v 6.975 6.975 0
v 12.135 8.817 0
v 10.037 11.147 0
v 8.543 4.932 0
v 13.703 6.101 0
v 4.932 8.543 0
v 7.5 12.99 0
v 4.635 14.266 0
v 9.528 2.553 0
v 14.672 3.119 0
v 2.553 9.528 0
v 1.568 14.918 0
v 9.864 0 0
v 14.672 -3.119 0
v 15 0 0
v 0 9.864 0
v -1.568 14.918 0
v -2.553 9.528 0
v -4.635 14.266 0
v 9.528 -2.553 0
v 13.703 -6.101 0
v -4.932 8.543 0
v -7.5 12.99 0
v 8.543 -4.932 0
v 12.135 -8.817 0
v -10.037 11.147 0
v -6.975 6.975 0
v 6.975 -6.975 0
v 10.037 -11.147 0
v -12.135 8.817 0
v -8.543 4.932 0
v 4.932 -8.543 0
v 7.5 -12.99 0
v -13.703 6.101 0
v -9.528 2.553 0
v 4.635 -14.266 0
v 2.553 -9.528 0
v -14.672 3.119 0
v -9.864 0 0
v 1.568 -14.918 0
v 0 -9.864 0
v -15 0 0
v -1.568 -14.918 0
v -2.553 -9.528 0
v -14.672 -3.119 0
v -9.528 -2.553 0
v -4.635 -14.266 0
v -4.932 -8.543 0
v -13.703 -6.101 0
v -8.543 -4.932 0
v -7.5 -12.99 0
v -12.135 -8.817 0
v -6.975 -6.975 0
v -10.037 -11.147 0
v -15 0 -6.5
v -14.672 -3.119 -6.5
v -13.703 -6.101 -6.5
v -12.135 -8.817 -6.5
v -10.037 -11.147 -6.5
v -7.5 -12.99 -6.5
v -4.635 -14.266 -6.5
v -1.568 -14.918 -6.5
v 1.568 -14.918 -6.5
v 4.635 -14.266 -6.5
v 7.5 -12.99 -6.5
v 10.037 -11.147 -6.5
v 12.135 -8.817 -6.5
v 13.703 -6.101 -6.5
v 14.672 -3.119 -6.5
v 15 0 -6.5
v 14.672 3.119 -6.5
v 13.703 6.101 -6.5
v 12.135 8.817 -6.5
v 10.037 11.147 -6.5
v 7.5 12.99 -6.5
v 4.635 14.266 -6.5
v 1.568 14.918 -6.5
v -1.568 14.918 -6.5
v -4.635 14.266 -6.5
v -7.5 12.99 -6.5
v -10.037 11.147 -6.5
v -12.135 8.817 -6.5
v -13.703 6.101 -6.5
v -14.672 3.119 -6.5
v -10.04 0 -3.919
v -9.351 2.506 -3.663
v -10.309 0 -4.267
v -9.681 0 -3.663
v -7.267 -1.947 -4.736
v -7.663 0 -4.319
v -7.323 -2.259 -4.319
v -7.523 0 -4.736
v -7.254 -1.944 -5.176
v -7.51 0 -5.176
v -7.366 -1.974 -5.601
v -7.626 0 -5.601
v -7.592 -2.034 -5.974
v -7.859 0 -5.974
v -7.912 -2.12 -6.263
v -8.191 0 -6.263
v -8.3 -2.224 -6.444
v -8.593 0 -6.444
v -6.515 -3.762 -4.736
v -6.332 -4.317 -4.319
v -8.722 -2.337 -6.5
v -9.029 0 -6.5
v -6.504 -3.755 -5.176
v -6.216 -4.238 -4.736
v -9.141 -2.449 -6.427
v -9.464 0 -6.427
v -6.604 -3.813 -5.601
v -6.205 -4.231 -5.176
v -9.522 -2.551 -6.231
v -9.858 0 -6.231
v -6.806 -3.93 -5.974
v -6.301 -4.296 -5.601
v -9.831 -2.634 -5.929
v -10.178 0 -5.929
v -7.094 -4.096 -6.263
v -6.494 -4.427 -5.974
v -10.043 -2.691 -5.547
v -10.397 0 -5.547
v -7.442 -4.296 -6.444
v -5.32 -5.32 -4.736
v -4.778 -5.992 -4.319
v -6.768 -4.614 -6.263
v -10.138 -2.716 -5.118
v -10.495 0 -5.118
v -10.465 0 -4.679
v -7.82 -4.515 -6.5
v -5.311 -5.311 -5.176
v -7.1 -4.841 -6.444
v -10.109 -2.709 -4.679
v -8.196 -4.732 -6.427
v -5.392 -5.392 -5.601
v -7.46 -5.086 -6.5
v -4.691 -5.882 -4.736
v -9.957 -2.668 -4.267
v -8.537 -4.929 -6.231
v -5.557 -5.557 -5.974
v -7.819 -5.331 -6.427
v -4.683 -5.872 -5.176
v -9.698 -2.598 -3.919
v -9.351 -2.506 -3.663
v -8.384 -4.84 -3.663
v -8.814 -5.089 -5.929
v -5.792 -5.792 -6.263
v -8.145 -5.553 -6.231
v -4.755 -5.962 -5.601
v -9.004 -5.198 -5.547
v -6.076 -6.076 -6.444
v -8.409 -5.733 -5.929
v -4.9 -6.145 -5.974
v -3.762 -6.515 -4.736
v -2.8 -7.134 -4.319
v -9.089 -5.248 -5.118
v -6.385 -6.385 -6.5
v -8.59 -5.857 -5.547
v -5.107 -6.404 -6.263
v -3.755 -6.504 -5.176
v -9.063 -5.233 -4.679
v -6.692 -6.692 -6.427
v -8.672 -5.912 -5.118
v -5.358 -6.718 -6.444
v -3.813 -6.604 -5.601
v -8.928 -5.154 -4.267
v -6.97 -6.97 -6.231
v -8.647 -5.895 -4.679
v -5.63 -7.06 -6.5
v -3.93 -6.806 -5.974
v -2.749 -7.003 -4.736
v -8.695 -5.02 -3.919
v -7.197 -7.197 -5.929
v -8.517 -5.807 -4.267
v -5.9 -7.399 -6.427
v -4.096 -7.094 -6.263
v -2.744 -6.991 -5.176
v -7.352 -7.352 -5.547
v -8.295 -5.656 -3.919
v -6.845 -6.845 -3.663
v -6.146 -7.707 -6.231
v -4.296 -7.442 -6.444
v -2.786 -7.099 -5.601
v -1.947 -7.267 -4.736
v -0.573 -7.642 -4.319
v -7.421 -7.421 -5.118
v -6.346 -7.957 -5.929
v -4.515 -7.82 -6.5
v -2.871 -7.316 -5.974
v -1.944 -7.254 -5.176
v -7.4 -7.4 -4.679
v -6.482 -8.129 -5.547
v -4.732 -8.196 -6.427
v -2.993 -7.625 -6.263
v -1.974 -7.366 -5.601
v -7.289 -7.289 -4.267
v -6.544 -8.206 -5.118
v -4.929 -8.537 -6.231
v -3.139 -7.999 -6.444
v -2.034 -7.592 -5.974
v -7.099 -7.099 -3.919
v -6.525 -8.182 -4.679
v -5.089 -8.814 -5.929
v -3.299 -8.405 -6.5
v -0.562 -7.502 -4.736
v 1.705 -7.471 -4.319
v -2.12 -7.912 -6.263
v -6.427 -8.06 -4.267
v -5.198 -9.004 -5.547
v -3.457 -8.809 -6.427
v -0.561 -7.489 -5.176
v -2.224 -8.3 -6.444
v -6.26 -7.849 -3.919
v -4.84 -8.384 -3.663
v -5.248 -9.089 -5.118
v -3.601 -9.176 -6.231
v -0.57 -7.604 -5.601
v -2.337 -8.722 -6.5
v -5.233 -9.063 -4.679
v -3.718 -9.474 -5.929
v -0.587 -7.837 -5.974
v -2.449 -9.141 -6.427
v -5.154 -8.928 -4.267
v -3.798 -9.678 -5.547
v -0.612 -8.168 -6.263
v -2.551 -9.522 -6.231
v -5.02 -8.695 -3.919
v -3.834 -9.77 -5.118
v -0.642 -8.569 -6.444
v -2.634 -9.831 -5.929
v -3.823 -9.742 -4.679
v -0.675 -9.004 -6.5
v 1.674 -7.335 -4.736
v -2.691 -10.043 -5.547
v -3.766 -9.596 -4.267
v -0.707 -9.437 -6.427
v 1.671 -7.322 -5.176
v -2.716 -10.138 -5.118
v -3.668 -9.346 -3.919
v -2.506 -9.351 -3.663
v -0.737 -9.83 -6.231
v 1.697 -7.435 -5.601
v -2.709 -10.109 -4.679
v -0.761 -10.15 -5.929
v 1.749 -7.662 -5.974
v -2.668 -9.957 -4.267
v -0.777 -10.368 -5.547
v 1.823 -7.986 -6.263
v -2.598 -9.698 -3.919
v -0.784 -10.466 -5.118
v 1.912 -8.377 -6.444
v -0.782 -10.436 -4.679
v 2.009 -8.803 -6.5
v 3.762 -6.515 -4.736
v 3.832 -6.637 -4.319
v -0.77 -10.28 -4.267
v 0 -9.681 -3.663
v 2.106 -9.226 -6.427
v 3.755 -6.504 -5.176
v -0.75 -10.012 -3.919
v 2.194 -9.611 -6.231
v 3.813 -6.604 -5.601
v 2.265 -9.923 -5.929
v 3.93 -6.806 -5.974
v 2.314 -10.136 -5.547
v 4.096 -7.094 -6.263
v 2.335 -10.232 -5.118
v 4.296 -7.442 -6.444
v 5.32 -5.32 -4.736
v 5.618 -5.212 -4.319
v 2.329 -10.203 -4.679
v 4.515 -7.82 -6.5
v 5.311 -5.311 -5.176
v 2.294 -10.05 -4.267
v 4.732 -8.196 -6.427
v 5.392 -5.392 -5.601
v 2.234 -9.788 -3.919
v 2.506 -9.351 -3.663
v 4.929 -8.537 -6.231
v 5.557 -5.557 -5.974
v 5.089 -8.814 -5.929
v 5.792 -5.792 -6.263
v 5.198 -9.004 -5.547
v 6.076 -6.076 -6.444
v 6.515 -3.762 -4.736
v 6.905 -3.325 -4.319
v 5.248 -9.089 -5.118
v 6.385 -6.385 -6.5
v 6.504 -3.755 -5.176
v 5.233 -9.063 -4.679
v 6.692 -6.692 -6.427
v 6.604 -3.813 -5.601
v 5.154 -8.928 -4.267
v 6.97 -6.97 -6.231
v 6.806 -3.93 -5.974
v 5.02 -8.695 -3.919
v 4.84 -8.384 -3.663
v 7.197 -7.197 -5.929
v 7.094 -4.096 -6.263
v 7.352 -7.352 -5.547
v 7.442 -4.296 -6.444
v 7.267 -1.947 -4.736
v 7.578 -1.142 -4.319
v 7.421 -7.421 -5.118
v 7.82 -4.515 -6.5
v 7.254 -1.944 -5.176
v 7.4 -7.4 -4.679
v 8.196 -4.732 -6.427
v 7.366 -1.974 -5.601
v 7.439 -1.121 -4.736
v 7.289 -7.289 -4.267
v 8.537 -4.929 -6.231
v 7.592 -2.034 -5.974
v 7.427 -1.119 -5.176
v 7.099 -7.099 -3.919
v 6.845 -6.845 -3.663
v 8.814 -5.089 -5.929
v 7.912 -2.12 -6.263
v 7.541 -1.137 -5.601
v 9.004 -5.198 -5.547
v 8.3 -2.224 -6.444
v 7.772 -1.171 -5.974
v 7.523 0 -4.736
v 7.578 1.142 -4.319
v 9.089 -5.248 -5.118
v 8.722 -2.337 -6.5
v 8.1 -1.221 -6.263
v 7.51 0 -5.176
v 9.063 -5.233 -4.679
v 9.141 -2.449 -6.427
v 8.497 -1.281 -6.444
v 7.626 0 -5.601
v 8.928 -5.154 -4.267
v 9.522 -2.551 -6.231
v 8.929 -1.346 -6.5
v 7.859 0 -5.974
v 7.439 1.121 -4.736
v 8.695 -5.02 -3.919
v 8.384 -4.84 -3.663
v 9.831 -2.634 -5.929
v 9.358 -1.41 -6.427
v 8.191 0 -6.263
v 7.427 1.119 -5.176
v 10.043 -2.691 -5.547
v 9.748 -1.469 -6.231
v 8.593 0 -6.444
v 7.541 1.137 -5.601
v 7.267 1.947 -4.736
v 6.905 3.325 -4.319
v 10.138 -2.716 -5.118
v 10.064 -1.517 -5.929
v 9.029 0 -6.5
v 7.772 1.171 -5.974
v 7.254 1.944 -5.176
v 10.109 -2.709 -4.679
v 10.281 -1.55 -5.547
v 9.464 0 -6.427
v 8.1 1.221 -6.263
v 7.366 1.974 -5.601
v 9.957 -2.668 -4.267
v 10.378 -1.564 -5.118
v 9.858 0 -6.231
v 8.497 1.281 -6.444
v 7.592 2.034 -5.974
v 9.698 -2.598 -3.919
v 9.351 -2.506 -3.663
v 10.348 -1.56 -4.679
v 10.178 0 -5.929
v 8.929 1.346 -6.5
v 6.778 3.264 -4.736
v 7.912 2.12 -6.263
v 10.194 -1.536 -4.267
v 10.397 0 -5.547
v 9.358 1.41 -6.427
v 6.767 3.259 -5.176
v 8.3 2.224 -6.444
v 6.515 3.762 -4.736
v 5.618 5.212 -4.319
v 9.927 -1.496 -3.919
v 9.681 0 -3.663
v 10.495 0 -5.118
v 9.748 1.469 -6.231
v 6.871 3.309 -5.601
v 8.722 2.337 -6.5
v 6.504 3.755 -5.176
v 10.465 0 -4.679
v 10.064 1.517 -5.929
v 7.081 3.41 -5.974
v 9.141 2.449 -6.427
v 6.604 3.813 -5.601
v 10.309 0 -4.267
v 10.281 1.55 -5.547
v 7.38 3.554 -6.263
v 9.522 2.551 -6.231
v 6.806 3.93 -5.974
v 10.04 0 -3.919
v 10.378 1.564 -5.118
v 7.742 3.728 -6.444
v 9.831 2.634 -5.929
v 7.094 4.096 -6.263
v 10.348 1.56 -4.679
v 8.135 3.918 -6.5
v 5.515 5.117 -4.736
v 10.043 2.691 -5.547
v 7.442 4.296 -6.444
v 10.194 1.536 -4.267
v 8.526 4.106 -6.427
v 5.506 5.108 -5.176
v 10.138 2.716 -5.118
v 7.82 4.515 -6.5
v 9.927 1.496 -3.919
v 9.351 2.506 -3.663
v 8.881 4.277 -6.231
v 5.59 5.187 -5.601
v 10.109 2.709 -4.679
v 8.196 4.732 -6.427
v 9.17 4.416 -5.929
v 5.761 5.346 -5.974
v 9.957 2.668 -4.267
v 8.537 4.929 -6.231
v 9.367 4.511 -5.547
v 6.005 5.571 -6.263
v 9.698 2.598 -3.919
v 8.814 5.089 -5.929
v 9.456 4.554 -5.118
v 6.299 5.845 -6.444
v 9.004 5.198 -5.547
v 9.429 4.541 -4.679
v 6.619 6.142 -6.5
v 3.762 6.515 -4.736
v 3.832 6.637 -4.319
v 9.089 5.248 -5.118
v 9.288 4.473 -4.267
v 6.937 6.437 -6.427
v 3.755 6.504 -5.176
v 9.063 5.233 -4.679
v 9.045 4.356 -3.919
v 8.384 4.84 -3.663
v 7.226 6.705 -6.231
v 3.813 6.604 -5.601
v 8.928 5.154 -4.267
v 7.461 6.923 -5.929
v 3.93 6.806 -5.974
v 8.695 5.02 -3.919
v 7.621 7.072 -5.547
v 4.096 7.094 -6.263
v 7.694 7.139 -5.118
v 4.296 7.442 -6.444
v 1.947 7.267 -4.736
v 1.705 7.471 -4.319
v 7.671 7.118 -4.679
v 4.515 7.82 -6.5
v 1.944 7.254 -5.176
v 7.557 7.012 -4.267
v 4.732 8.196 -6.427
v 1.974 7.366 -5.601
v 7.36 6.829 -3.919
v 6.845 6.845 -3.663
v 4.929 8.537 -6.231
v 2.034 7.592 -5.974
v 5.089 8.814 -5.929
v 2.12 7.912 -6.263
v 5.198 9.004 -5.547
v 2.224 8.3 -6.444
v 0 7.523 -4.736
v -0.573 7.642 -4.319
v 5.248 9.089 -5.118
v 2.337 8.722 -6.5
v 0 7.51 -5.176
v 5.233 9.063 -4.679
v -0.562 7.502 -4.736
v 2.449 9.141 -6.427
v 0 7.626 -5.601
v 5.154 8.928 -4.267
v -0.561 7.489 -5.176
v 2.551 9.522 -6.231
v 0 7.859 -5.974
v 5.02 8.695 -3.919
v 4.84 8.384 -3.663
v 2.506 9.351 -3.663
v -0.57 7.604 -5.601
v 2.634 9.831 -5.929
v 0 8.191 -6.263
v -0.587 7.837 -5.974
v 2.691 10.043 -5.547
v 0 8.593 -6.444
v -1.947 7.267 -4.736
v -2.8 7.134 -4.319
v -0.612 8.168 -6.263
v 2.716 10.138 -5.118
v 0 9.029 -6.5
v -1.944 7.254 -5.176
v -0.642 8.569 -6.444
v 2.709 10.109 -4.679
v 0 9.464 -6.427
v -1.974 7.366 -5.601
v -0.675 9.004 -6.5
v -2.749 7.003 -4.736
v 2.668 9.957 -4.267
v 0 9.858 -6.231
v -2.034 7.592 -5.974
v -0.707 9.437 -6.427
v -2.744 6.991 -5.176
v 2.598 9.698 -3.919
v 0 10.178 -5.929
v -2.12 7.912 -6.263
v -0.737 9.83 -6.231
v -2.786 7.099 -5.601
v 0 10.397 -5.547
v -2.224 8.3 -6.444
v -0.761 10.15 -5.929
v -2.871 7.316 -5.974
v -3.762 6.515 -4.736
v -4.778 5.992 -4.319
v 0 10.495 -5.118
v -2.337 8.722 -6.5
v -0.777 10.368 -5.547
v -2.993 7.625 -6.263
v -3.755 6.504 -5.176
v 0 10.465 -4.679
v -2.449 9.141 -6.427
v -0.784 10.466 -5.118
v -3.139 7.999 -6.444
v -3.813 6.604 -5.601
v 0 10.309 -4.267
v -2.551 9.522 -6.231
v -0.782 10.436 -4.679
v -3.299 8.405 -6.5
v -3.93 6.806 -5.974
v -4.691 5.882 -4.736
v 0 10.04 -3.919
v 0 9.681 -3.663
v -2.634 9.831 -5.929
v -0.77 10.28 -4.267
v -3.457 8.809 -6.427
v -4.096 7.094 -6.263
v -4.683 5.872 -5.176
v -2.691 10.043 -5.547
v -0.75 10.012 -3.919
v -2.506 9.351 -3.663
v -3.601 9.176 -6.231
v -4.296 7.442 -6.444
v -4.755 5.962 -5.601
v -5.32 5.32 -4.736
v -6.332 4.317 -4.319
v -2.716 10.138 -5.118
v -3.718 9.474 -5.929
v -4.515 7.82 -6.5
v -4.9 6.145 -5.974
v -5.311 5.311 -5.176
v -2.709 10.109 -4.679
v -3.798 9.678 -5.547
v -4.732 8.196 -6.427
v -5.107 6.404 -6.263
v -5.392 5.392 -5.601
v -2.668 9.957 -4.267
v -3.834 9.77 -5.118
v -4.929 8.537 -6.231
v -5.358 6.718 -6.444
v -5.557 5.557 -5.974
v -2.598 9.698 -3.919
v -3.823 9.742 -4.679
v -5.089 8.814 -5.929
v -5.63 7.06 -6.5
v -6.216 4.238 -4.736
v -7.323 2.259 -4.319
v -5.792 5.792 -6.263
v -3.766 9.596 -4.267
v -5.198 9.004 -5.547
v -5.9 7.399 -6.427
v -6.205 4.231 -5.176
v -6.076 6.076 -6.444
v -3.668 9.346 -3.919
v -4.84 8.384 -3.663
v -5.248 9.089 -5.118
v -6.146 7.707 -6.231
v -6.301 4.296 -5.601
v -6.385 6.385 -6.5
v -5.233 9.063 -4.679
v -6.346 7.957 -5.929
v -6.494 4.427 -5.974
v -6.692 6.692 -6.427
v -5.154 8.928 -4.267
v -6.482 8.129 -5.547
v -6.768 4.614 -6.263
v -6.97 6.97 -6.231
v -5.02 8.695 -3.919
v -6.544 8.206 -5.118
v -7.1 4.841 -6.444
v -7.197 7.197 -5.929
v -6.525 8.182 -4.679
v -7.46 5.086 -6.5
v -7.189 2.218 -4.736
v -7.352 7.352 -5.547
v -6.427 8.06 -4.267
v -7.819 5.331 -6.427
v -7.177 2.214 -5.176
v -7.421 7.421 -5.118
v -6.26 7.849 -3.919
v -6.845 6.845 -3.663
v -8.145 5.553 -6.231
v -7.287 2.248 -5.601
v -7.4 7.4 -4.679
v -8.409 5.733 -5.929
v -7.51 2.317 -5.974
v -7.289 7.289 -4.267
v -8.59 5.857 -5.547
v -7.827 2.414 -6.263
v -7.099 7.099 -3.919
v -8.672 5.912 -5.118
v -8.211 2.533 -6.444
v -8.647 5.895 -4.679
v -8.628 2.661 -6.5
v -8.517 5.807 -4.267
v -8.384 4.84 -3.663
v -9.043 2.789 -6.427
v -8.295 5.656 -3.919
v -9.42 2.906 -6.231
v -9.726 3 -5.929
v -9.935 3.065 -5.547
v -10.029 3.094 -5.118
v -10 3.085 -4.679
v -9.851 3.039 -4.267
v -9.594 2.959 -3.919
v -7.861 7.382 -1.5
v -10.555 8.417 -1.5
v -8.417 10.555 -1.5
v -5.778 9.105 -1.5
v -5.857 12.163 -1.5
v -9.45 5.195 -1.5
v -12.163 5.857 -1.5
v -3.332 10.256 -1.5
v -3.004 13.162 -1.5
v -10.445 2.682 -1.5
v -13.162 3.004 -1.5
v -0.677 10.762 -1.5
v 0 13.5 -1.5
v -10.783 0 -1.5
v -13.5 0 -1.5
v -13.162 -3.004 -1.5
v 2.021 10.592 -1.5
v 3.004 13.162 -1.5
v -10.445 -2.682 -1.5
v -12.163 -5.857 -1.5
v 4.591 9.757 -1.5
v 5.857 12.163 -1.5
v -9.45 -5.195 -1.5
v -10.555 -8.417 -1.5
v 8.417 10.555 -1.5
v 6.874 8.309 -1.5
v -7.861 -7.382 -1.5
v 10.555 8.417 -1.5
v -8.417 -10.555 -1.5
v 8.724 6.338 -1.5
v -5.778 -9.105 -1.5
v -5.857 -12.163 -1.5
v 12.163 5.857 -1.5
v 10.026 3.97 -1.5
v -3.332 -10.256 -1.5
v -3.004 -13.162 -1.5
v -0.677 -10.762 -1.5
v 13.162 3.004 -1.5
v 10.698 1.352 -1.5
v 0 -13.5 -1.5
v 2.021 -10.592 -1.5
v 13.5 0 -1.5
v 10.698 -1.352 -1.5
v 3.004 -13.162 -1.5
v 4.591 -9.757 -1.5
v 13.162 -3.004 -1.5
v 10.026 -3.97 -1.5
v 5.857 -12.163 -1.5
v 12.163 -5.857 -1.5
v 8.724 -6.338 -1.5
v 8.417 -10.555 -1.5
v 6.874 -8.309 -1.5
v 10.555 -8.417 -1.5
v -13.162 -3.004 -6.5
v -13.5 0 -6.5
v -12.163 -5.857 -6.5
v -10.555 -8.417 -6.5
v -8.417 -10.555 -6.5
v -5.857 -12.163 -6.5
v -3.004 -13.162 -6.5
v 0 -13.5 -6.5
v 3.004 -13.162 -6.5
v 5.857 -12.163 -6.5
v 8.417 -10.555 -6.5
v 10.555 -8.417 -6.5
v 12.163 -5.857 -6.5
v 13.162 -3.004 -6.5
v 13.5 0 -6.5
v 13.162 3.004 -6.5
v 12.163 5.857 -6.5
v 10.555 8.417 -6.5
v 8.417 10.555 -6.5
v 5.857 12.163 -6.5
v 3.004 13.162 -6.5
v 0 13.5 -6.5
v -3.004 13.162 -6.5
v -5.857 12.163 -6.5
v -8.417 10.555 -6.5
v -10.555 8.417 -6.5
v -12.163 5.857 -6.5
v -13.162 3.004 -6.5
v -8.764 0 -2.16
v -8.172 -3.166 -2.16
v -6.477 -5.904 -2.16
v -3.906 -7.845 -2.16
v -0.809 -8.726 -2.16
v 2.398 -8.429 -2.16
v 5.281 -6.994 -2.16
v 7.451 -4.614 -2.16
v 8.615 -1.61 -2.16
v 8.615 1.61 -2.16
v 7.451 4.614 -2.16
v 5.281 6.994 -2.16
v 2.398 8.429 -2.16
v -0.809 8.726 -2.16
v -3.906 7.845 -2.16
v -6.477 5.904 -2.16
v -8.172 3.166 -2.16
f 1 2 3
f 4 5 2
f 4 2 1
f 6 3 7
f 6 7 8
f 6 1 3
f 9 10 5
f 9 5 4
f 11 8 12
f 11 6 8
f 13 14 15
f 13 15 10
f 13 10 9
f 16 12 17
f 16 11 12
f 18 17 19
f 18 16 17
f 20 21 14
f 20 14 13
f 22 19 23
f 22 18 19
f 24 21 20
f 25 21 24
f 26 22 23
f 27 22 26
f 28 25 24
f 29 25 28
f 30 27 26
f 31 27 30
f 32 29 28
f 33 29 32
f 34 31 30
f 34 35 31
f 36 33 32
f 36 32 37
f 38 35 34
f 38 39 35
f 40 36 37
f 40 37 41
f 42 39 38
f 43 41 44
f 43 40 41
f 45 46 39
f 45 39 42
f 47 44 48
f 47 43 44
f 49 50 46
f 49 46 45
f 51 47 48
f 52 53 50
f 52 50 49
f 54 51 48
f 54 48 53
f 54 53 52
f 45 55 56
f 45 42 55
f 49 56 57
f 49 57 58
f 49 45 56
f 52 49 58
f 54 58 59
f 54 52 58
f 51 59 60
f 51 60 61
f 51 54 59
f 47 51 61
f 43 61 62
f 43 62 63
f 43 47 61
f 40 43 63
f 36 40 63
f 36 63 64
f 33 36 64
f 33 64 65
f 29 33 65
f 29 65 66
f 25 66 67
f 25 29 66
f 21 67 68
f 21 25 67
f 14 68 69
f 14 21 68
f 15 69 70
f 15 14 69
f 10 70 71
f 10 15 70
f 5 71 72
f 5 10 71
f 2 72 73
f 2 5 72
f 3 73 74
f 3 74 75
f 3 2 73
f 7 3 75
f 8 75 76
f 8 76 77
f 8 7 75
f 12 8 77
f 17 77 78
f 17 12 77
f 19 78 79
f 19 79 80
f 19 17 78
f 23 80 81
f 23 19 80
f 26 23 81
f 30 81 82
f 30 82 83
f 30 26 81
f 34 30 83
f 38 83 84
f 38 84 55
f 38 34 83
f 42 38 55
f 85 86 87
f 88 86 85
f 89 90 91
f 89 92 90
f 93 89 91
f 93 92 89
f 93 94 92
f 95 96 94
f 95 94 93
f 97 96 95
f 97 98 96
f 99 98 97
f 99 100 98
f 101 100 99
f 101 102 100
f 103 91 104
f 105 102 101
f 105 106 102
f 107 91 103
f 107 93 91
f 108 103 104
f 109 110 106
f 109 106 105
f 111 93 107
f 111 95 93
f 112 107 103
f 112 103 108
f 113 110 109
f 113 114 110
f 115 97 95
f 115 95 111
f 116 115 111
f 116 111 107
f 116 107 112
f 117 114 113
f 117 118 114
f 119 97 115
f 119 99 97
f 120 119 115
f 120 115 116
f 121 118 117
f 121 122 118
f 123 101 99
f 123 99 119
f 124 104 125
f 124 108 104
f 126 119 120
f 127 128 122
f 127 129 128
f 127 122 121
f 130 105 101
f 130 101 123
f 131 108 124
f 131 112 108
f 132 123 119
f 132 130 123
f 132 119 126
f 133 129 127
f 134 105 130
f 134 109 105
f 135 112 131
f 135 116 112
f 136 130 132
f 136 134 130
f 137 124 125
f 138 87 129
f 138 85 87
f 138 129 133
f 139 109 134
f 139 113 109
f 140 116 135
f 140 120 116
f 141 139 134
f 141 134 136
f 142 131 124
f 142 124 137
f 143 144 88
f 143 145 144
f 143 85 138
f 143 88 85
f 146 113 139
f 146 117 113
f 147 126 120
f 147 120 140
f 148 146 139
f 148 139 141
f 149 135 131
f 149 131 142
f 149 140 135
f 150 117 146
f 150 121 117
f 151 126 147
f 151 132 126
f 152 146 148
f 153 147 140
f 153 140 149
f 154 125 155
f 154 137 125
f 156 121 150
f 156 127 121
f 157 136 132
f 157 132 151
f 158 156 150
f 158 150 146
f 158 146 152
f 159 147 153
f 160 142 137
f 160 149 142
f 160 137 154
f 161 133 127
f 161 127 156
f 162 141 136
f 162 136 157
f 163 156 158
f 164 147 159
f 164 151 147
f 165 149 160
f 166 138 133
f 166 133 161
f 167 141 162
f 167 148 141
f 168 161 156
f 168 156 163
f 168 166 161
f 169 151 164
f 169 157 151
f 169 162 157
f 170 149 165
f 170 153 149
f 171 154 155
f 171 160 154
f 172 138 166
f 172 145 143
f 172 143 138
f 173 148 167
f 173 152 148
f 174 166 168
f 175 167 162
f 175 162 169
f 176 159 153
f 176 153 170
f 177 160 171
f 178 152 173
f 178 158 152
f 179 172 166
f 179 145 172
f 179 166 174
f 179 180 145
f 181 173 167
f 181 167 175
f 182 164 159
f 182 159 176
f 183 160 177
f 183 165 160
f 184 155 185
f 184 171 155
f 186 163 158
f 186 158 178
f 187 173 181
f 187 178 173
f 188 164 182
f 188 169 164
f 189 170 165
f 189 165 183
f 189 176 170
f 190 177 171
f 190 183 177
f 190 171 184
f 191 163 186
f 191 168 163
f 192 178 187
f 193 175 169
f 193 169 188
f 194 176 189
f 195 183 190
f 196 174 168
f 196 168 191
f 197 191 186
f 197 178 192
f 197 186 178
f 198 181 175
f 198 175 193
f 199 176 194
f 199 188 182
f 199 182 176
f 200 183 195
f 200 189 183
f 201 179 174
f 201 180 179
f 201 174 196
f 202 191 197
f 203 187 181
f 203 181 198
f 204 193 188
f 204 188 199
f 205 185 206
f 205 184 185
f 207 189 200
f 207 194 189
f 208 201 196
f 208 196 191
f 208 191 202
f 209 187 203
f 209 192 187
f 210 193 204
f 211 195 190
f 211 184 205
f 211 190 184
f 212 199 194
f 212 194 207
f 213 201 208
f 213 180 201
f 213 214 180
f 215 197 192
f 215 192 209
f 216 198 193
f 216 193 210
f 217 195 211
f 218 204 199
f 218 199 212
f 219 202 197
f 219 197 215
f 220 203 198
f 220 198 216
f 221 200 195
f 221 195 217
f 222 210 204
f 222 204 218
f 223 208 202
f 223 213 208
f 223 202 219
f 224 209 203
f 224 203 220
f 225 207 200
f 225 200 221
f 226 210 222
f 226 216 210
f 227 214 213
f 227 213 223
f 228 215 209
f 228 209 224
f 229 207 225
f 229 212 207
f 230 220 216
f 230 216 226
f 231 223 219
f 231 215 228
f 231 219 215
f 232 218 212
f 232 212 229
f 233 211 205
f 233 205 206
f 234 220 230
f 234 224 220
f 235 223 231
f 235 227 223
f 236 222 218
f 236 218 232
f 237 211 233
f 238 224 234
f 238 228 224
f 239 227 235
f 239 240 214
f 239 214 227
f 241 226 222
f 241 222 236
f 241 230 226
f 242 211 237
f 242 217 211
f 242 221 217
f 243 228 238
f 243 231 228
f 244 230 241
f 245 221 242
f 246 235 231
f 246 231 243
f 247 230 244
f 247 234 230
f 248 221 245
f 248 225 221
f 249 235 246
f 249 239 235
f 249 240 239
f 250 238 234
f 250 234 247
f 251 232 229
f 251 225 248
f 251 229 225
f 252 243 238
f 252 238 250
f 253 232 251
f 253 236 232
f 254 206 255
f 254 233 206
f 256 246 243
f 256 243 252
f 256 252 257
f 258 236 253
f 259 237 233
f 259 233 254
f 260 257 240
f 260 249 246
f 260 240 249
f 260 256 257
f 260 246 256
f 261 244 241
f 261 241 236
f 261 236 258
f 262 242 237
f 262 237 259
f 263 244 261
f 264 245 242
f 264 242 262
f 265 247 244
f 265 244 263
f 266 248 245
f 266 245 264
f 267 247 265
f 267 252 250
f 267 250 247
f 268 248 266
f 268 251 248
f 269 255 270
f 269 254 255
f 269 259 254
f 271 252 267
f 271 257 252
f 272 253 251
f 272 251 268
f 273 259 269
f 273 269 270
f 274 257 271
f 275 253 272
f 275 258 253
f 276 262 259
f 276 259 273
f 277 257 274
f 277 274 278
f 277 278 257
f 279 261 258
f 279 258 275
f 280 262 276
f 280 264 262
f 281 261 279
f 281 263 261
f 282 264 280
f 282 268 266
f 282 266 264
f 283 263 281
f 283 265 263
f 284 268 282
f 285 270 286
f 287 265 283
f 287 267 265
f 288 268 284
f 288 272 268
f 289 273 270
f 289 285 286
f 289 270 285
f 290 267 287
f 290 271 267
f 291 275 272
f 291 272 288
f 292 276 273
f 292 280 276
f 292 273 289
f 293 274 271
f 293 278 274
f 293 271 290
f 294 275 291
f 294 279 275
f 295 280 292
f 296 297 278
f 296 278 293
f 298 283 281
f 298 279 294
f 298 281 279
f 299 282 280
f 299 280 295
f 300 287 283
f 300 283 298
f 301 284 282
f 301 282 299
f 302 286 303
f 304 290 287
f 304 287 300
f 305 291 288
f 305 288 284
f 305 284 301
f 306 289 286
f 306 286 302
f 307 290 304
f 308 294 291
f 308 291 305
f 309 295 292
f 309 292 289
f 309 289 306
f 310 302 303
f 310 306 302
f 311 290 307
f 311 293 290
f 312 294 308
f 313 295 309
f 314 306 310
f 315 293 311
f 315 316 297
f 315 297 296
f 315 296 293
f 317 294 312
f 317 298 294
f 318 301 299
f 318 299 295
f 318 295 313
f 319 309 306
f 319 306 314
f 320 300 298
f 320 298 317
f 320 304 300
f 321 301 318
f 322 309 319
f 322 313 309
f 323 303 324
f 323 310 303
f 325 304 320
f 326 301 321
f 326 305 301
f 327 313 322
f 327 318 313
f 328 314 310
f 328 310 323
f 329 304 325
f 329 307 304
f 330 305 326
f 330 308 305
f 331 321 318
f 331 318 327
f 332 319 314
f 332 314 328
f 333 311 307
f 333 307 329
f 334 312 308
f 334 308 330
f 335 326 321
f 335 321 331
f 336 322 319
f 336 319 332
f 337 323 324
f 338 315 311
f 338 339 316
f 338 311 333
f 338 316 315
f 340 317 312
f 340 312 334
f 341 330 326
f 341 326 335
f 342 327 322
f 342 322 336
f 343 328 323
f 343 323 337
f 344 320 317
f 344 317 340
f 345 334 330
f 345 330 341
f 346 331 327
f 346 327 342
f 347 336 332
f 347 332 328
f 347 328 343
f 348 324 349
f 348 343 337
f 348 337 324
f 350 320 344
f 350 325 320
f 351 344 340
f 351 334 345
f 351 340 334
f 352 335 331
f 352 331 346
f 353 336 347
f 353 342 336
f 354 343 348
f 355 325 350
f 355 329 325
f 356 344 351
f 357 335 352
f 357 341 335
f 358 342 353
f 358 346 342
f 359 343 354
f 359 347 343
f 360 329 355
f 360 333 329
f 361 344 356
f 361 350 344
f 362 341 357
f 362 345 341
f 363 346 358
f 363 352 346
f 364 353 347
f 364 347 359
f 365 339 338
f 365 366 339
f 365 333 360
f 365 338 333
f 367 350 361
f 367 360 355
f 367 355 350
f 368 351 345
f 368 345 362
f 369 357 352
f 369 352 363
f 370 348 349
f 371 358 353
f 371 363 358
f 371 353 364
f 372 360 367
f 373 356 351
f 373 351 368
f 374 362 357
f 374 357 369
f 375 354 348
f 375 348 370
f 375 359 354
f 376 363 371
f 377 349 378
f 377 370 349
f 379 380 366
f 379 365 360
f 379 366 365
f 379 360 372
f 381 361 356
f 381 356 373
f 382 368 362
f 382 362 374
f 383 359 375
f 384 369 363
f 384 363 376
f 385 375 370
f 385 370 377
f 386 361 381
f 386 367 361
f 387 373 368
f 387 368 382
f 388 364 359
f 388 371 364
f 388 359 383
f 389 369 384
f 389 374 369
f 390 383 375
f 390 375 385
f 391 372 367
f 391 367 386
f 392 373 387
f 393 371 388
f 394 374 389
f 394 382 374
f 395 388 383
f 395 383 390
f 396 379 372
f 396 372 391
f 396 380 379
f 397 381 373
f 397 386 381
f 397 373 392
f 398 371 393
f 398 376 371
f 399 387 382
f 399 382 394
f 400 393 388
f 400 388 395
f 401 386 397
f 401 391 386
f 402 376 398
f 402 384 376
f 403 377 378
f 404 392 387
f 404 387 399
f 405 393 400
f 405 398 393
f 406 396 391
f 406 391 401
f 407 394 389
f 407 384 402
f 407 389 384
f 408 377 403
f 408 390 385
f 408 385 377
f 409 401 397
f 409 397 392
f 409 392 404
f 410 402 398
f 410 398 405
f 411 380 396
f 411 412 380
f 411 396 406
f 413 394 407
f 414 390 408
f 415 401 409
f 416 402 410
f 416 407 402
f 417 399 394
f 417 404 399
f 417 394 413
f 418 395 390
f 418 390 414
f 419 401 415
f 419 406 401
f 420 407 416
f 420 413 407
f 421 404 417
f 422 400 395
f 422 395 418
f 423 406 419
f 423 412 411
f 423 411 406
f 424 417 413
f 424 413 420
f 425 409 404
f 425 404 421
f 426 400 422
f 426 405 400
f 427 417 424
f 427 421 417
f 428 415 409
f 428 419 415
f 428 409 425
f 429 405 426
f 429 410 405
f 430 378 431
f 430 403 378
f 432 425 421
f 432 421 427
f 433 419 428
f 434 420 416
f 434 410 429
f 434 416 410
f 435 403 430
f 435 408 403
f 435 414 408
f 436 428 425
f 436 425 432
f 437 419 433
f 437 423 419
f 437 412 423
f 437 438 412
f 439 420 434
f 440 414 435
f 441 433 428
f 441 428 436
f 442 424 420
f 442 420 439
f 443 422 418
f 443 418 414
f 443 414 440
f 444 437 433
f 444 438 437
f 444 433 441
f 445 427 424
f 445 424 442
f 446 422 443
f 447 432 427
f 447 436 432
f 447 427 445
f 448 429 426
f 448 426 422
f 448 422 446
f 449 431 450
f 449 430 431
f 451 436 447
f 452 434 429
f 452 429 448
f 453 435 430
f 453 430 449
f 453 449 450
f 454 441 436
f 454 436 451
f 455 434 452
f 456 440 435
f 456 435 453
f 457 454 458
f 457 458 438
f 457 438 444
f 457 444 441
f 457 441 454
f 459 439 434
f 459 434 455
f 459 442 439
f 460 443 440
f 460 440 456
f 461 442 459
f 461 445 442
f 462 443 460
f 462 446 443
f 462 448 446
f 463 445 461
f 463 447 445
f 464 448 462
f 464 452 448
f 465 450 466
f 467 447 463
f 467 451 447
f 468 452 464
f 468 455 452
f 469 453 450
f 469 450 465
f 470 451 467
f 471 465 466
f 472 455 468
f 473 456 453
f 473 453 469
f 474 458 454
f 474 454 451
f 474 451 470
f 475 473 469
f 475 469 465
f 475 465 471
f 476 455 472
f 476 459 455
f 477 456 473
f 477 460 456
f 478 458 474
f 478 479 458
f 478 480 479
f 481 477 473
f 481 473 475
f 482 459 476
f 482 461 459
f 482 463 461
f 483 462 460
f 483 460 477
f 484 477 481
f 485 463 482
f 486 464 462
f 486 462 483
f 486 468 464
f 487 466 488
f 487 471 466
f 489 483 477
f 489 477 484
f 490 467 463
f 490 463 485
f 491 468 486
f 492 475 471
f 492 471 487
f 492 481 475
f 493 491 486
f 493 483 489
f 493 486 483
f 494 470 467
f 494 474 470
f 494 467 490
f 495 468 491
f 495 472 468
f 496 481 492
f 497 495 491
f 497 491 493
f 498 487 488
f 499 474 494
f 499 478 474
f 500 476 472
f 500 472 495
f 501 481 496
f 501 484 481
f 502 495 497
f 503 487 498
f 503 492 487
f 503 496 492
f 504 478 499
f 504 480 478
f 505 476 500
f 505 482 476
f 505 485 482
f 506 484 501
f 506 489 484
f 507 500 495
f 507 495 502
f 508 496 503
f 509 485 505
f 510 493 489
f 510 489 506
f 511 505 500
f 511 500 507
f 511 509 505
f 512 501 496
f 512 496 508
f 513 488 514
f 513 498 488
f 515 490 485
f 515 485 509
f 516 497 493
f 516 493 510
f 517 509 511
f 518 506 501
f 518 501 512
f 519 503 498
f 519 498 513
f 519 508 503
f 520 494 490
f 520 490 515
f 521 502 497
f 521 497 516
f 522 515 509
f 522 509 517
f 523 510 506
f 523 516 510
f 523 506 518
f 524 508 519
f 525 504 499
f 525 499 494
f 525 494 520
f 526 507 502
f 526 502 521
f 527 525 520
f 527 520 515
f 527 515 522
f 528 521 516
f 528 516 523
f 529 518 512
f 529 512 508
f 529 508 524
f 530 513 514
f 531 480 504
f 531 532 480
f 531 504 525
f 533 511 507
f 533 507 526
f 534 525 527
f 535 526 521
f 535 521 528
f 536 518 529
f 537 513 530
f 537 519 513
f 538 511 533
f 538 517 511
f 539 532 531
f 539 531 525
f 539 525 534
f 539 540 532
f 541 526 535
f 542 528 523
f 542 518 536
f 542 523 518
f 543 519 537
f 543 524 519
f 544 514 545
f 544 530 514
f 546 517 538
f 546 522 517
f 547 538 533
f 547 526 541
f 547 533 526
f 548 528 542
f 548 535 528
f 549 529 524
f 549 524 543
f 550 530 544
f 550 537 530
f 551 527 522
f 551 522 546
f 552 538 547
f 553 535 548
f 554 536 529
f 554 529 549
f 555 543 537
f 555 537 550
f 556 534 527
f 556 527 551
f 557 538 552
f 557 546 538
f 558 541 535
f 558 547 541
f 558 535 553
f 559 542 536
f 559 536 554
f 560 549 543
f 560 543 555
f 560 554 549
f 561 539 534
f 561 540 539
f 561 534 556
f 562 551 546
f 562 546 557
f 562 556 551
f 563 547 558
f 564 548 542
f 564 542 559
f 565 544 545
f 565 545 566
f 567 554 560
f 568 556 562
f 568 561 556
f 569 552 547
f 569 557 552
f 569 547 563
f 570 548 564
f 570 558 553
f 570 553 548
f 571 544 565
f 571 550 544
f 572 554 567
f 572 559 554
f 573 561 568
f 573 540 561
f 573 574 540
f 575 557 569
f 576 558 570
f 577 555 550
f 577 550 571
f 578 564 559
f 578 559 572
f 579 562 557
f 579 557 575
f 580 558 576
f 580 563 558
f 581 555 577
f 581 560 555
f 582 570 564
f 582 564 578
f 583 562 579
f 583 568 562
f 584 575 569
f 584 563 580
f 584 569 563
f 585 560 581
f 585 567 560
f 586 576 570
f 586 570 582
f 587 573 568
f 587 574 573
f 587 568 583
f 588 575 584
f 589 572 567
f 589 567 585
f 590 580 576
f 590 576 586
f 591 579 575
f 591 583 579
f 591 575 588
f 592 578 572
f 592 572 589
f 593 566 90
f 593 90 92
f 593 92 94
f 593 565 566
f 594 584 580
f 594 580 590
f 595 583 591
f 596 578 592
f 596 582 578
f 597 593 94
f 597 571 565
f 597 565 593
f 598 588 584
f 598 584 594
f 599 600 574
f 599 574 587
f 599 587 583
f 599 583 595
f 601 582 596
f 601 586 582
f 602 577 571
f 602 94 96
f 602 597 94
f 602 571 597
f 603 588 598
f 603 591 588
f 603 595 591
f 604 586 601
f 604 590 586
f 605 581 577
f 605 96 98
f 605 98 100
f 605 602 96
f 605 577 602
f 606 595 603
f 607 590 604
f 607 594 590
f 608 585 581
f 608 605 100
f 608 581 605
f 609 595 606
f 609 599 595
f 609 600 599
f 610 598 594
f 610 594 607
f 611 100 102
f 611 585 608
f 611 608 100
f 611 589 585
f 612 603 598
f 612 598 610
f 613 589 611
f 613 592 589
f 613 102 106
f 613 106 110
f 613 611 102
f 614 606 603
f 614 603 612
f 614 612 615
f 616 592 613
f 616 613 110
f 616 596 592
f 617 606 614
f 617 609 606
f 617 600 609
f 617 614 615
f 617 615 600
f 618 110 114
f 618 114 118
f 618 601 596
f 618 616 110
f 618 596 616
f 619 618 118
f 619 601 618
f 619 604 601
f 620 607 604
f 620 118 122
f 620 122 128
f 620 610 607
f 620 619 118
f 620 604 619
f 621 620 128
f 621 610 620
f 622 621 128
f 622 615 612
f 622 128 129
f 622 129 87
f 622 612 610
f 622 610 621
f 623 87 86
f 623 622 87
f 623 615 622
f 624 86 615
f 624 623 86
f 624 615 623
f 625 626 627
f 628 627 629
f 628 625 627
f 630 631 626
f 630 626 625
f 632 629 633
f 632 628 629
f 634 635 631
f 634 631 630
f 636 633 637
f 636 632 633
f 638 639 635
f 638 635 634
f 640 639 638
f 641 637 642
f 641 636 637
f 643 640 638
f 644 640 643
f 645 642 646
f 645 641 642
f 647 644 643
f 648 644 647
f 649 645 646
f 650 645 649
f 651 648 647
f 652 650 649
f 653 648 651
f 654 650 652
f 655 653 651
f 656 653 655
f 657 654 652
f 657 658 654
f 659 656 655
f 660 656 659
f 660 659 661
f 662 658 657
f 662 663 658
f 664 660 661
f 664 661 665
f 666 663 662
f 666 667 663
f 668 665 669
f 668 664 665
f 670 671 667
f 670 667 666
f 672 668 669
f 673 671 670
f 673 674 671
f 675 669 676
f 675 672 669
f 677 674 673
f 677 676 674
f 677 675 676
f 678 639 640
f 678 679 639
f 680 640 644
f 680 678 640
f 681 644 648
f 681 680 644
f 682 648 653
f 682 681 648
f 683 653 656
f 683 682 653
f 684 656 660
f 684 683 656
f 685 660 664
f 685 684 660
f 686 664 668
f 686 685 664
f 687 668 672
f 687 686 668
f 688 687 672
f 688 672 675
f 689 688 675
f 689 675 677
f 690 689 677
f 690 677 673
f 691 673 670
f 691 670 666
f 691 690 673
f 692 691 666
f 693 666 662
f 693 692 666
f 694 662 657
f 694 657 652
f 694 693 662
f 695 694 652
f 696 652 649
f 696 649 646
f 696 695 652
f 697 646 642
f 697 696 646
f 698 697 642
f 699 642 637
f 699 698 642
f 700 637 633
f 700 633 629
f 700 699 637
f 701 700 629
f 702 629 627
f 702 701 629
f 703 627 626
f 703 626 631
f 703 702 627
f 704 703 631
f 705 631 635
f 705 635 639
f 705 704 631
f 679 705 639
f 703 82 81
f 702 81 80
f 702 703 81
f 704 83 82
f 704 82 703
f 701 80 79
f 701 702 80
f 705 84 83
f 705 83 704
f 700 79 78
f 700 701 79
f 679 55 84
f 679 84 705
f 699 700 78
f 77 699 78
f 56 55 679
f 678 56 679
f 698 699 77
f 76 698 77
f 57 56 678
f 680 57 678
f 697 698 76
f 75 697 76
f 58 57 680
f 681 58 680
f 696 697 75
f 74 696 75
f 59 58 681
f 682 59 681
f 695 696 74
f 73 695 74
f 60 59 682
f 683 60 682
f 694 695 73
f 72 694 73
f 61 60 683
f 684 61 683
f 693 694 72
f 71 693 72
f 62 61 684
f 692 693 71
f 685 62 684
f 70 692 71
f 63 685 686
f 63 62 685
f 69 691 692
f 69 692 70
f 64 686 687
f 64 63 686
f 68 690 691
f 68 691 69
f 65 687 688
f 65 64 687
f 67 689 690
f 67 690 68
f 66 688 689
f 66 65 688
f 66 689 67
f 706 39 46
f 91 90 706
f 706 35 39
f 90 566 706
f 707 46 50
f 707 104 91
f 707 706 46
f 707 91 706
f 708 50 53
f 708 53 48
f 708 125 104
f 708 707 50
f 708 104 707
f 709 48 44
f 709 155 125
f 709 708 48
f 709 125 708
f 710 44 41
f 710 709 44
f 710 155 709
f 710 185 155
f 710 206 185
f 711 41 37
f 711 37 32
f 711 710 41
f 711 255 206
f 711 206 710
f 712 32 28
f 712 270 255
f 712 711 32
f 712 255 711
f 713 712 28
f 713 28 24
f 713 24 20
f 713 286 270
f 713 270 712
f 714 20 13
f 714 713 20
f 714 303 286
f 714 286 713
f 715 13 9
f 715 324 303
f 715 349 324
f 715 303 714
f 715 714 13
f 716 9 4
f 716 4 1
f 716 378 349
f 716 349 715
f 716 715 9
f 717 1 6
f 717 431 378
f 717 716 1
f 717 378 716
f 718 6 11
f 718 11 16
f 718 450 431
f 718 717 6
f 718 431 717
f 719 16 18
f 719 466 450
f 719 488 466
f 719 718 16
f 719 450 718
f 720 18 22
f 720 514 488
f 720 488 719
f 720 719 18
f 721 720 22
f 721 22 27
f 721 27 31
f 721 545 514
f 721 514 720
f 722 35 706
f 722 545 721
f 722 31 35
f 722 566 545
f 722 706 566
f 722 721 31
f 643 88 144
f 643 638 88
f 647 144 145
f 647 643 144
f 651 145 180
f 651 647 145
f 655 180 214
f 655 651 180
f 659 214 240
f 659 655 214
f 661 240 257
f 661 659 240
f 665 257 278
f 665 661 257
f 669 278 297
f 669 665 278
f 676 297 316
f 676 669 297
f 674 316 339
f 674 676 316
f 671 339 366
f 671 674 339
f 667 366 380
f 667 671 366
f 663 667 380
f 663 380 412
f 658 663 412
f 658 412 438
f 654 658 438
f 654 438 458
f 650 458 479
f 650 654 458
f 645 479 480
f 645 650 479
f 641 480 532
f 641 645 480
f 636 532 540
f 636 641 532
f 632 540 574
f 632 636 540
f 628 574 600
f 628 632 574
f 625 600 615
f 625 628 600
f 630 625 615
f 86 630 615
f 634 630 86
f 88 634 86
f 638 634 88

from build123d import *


with BuildPart() as part:
    # Sketch2 → Revolve1 (revolve)
    with BuildSketch(Plane.YZ, mode=Mode.PRIVATE) as revolve1_sk:
        with BuildLine():
            Line((-15, 0), (-9.864137891, 0))
            Line((-9.864137891, 0), (-7.663490214, -4.31901425))
            ThreePointArc((-7.663490214, -4.31901425), (-9.463525492, -6.426584774), (-9.68098575, -3.663490214))
            Line((-9.68098575, -3.663490214), (-10.783339073, -1.5))
            Line((-10.783339073, -1.5), (-13.5, -1.5))
            Line((-13.5, -1.5), (-13.5, -6.5))
            Line((-13.5, -6.5), (-15, -6.5))
            Line((-15, -6.5), (-15, 0))
        make_face()
    revolve(revolve1_sk.sketch.rotate(Axis((0, 0, 0), (0, 0, 1)), 270), axis=Axis((0, 0, 0), (0, 0, 1)))


solid = part.part
